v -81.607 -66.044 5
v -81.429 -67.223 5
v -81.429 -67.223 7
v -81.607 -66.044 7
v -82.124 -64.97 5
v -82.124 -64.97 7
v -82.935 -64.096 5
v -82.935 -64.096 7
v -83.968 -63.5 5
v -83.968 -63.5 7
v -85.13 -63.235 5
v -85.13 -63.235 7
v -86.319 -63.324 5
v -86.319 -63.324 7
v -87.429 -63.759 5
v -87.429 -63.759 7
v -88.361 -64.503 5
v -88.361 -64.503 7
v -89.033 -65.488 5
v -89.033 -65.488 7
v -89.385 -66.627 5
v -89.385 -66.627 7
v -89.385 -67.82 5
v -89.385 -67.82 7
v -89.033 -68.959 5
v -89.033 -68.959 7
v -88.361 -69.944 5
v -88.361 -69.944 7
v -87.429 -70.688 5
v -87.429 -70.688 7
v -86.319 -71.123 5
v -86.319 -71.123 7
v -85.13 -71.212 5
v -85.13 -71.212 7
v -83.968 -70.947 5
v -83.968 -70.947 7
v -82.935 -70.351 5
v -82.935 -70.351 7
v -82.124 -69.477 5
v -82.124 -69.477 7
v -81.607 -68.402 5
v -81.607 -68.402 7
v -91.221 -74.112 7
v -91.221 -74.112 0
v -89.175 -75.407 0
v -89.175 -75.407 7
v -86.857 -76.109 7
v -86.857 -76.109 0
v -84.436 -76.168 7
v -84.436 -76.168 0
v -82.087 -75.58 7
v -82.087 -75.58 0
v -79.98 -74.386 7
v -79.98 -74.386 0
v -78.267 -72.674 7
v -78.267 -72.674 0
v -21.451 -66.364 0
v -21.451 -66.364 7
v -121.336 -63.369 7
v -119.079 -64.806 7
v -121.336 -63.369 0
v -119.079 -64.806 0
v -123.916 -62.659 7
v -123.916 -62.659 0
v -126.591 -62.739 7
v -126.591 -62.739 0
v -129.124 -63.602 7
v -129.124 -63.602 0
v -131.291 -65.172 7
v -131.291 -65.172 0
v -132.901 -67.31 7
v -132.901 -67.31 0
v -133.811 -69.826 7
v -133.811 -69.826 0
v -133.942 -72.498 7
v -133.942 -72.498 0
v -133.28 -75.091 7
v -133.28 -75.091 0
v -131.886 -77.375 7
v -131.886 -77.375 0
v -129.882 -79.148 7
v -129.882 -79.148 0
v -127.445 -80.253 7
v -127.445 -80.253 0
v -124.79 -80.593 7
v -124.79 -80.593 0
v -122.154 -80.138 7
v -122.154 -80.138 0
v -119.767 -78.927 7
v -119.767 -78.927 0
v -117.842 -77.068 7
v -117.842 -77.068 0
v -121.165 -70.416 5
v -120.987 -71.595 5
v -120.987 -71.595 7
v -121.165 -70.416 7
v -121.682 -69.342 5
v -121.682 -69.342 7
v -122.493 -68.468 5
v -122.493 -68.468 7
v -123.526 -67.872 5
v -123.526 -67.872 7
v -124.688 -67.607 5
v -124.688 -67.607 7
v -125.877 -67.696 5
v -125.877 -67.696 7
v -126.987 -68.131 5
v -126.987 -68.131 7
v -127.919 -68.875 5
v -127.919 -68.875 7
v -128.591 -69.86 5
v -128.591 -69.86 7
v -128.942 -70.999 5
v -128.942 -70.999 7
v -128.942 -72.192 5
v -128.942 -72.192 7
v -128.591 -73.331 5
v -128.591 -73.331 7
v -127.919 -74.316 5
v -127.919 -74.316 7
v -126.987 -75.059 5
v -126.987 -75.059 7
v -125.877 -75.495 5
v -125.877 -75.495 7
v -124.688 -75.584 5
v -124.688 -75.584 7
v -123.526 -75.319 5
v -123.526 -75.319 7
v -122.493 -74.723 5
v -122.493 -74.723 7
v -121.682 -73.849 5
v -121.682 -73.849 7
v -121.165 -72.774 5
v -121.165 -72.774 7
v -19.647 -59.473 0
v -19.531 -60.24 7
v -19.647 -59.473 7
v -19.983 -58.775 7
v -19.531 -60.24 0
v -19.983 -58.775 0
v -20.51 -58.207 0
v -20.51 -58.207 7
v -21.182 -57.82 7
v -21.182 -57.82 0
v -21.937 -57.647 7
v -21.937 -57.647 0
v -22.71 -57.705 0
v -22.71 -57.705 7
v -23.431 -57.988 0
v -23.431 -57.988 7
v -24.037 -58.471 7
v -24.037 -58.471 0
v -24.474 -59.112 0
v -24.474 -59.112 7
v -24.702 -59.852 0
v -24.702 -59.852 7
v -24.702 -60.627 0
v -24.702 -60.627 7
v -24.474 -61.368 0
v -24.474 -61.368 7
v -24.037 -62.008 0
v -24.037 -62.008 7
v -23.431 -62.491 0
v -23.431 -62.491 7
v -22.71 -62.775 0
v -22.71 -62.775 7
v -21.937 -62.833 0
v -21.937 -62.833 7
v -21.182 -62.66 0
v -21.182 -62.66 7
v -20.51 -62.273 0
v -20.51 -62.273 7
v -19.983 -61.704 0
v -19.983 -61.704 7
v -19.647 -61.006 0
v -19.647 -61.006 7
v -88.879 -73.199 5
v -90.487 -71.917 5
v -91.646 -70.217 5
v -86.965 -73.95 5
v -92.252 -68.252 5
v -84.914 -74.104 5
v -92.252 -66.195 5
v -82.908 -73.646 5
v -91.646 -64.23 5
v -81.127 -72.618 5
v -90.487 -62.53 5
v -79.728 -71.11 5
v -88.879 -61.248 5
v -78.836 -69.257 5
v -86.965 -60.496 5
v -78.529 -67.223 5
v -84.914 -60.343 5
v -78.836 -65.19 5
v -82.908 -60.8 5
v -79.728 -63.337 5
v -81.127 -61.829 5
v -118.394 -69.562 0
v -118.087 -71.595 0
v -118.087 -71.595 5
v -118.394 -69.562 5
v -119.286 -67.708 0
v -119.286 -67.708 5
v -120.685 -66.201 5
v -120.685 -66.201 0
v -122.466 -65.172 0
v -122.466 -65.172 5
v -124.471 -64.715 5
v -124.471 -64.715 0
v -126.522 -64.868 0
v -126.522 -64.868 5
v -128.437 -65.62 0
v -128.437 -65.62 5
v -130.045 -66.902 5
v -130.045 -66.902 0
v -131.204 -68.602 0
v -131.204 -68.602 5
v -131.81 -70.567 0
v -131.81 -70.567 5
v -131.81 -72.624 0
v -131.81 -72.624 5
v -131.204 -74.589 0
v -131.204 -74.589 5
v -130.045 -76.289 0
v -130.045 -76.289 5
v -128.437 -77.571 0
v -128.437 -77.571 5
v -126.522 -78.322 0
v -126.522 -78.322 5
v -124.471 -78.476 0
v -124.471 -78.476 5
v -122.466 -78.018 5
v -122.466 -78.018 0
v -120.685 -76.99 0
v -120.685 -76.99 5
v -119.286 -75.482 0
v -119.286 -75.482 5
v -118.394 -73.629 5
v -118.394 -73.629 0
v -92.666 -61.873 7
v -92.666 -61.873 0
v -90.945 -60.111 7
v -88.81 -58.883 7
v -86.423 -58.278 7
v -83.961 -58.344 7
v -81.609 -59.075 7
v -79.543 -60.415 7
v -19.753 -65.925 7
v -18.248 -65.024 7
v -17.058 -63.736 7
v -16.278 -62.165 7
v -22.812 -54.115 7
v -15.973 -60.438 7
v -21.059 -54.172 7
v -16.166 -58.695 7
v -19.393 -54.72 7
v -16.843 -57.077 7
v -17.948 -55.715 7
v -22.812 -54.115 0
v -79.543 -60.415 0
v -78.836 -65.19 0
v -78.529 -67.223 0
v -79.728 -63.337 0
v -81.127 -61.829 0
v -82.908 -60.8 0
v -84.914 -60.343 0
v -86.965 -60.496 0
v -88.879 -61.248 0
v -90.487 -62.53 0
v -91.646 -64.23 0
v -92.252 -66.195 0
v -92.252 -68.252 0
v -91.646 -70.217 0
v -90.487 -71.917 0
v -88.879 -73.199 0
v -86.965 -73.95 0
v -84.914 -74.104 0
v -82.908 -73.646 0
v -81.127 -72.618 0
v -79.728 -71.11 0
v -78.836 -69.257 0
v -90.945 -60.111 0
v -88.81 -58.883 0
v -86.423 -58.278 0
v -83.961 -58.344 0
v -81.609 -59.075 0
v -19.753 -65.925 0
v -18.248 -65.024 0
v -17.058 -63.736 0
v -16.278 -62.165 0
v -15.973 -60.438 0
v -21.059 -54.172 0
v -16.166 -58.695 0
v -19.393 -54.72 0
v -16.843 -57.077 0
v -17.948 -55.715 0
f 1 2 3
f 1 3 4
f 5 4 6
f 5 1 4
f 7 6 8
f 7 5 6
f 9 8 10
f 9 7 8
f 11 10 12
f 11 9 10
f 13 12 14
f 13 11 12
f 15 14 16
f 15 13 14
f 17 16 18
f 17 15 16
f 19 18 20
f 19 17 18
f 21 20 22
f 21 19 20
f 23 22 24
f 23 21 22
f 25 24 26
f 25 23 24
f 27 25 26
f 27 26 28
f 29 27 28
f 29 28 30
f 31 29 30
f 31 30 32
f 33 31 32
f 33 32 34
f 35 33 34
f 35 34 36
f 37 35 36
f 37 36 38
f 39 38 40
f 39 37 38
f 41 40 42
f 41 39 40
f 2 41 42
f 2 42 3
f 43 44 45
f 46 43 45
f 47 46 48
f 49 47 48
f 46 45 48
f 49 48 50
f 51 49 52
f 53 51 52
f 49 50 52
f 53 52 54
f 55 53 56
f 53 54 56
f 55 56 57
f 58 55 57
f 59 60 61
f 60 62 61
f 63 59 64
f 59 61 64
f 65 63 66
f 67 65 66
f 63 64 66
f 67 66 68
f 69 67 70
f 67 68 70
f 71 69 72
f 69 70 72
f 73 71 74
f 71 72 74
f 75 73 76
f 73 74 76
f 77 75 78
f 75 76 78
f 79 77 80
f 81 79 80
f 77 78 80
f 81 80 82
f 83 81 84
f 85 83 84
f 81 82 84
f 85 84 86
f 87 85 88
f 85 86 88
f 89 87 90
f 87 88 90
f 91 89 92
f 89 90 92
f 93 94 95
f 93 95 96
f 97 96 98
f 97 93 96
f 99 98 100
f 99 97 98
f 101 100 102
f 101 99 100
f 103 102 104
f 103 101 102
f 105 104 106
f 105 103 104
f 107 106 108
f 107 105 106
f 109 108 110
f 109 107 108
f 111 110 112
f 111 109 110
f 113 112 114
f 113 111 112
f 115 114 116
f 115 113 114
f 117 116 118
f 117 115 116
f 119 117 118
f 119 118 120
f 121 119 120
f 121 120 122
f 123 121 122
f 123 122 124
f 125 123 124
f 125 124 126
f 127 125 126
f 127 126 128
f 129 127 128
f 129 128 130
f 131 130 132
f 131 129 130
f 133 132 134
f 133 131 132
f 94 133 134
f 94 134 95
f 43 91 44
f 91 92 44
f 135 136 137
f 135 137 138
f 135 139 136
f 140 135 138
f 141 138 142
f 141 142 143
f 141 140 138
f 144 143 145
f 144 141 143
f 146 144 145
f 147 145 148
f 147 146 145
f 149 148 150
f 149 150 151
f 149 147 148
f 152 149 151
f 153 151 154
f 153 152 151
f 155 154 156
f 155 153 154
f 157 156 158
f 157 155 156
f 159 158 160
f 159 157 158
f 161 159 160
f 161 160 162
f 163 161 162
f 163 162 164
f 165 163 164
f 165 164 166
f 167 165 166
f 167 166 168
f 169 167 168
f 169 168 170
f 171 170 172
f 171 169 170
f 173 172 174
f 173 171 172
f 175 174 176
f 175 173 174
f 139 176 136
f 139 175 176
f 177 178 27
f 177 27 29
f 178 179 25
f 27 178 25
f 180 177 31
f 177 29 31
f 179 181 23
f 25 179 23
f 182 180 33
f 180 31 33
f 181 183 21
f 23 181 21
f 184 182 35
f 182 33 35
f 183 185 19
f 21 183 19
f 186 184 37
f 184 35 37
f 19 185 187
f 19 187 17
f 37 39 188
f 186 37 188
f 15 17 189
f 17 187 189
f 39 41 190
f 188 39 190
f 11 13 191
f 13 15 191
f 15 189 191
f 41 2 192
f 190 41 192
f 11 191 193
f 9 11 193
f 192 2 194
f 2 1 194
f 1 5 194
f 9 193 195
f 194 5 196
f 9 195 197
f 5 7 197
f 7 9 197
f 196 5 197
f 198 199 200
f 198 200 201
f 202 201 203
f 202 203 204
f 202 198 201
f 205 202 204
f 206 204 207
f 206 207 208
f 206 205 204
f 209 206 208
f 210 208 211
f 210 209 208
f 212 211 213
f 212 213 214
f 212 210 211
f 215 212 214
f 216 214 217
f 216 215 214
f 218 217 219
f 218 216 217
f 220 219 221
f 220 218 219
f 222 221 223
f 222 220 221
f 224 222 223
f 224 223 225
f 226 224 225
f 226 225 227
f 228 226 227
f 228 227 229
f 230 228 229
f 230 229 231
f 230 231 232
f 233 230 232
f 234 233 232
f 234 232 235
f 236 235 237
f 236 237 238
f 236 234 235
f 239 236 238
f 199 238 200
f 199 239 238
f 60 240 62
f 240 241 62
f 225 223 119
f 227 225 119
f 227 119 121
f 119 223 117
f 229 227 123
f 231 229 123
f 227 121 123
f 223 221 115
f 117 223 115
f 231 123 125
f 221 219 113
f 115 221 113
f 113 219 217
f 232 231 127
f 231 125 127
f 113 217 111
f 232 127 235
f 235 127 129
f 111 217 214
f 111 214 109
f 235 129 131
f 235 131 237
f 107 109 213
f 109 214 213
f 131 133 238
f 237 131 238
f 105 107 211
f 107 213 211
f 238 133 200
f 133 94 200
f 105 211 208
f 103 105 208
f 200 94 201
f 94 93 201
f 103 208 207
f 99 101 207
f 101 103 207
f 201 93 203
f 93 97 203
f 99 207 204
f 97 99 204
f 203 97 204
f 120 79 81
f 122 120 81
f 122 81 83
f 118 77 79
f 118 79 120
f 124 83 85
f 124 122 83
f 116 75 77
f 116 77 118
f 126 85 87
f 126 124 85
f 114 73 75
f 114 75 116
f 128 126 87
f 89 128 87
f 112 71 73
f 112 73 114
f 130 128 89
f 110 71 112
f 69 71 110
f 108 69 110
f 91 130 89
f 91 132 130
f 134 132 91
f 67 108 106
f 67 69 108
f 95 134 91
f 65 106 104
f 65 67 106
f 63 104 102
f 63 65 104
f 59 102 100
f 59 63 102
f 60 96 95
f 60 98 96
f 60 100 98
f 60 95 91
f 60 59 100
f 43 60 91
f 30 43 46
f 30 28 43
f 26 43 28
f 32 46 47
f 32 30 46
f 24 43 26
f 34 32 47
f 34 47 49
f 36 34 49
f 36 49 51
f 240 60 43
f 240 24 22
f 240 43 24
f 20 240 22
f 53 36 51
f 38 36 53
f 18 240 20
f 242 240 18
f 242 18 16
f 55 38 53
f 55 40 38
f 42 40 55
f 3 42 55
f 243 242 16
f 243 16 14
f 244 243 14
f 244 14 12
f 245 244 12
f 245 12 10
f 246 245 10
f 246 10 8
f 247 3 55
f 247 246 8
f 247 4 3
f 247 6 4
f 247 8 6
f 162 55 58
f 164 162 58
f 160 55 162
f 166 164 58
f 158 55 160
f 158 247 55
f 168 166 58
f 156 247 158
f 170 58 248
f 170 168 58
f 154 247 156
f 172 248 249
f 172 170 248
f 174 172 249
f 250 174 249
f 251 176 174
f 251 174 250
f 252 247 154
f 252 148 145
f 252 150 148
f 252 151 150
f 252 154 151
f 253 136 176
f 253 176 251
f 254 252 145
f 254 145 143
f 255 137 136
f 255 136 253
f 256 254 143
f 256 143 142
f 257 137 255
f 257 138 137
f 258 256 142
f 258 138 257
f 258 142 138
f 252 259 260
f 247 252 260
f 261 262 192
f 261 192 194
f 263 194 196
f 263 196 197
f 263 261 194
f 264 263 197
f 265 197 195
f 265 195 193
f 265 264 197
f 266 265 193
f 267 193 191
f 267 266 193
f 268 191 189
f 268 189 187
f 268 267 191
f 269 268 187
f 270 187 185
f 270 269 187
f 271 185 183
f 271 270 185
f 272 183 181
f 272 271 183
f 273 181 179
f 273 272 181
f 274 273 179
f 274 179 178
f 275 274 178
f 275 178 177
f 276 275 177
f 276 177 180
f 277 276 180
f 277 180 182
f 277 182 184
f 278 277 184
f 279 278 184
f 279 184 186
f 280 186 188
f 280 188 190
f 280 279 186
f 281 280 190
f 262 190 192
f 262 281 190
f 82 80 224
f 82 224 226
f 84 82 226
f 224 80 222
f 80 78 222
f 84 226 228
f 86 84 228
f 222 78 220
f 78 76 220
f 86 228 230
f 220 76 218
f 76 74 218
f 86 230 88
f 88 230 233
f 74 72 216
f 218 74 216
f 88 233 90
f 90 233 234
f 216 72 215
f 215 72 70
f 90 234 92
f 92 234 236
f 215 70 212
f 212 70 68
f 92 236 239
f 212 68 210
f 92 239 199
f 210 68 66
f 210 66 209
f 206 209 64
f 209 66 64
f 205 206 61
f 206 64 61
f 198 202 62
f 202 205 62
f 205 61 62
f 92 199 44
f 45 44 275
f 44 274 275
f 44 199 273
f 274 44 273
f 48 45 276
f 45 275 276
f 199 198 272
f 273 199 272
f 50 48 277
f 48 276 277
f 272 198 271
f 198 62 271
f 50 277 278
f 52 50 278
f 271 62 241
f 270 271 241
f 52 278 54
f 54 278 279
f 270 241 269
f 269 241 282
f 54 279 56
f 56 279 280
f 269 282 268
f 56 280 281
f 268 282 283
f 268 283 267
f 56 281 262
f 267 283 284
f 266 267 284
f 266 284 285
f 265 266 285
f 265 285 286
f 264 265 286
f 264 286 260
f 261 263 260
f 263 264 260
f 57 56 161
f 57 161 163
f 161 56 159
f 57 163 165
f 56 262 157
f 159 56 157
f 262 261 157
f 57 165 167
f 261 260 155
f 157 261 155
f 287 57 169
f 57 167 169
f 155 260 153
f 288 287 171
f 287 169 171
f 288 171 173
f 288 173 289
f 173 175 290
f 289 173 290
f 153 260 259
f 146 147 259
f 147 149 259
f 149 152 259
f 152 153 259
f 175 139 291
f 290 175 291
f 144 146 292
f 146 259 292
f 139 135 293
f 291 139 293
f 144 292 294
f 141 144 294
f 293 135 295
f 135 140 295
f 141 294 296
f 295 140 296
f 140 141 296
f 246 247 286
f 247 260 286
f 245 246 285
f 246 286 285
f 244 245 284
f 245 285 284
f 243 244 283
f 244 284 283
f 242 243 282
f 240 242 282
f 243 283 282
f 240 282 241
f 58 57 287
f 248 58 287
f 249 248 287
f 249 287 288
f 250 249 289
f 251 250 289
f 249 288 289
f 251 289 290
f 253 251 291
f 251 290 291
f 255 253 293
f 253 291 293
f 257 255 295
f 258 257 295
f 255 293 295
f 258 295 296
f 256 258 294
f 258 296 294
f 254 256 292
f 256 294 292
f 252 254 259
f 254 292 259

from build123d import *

# Parameters (mm, degrees)
SKETCH1_R           = 2.6
SKETCH1_R_2         = 6.9
BOSS_EXTRUDE1_DEPTH = 5
SKETCH2_R           = 2.6
SKETCH2_R_2         = 4
BOSS_EXTRUDE2_DEPTH = 2


with BuildPart() as part:
    # Sketch1 → Boss-Extrude1 (new body)
    with BuildSketch(Plane.XY):
        with BuildLine():
            Line((-117.842377899, -77.068349263), (-91.221161774, -74.112086796))
            ThreePointArc((-91.221161774, -74.112086796), (-84.435913767, -76.1684327), (-78.267124508, -72.673552434))
            Line((-78.267124508, -72.673552434), (-21.451382857, -66.364214657))
            ThreePointArc((-21.451382857, -66.364214657), (-16.007105356, -59.559722092), (-22.811597922, -54.115444591))
            Line((-22.811597922, -54.115444591), (-79.542760834, -60.415389973))
            ThreePointArc((-79.542760834, -60.415389973), (-86.42258563, -58.278403776), (-92.665955577, -61.872709124))
            Line((-92.665955577, -61.872709124), (-119.079141177, -64.805869985))
            ThreePointArc((-119.079141177, -64.805869985), (-133.941604274, -72.498469269), (-117.842377899, -77.068349263))
        make_face()
        with Locations((-22.131490389, -60.239829624)):
            Circle(SKETCH1_R, mode=Mode.SUBTRACT)
        with Locations((-85.429249698, -67.223418238)):
            Circle(SKETCH1_R_2, mode=Mode.SUBTRACT)
        with Locations((-124.987033061, -71.595333402)):
            Circle(SKETCH1_R_2, mode=Mode.SUBTRACT)
    extrude(amount=BOSS_EXTRUDE1_DEPTH)

    # Sketch2 → Boss-Extrude2 (add)
    with BuildSketch(Plane.XY.offset(5)):
        with BuildLine():
            Line((-22.811597922, -54.115444591), (-79.542760834, -60.415389973))
            ThreePointArc((-79.542760834, -60.415389973), (-86.42258563, -58.278403776), (-92.665955577, -61.872709124))
            Line((-92.665955577, -61.872709124), (-119.079141177, -64.805869985))
            ThreePointArc((-119.079141177, -64.805869985), (-133.941604274, -72.498469269), (-117.842377899, -77.068349263))
            Line((-117.842377899, -77.068349263), (-91.221161774, -74.112086796))
            ThreePointArc((-91.221161774, -74.112086796), (-84.435913767, -76.1684327), (-78.267124508, -72.673552434))
            Line((-78.267124508, -72.673552434), (-21.451382857, -66.364214657))
            ThreePointArc((-21.451382857, -66.364214657), (-16.007105356, -59.559722092), (-22.811597922, -54.115444591))
        make_face()
        with Locations((-22.131490389, -60.239829624)):
            Circle(SKETCH2_R, mode=Mode.SUBTRACT)
        with Locations((-85.429249698, -67.223418238)):
            Circle(SKETCH2_R_2, mode=Mode.SUBTRACT)
        with Locations((-124.987033061, -71.595333402)):
            Circle(SKETCH2_R_2, mode=Mode.SUBTRACT)
    extrude(amount=BOSS_EXTRUDE2_DEPTH)


solid = part.part
